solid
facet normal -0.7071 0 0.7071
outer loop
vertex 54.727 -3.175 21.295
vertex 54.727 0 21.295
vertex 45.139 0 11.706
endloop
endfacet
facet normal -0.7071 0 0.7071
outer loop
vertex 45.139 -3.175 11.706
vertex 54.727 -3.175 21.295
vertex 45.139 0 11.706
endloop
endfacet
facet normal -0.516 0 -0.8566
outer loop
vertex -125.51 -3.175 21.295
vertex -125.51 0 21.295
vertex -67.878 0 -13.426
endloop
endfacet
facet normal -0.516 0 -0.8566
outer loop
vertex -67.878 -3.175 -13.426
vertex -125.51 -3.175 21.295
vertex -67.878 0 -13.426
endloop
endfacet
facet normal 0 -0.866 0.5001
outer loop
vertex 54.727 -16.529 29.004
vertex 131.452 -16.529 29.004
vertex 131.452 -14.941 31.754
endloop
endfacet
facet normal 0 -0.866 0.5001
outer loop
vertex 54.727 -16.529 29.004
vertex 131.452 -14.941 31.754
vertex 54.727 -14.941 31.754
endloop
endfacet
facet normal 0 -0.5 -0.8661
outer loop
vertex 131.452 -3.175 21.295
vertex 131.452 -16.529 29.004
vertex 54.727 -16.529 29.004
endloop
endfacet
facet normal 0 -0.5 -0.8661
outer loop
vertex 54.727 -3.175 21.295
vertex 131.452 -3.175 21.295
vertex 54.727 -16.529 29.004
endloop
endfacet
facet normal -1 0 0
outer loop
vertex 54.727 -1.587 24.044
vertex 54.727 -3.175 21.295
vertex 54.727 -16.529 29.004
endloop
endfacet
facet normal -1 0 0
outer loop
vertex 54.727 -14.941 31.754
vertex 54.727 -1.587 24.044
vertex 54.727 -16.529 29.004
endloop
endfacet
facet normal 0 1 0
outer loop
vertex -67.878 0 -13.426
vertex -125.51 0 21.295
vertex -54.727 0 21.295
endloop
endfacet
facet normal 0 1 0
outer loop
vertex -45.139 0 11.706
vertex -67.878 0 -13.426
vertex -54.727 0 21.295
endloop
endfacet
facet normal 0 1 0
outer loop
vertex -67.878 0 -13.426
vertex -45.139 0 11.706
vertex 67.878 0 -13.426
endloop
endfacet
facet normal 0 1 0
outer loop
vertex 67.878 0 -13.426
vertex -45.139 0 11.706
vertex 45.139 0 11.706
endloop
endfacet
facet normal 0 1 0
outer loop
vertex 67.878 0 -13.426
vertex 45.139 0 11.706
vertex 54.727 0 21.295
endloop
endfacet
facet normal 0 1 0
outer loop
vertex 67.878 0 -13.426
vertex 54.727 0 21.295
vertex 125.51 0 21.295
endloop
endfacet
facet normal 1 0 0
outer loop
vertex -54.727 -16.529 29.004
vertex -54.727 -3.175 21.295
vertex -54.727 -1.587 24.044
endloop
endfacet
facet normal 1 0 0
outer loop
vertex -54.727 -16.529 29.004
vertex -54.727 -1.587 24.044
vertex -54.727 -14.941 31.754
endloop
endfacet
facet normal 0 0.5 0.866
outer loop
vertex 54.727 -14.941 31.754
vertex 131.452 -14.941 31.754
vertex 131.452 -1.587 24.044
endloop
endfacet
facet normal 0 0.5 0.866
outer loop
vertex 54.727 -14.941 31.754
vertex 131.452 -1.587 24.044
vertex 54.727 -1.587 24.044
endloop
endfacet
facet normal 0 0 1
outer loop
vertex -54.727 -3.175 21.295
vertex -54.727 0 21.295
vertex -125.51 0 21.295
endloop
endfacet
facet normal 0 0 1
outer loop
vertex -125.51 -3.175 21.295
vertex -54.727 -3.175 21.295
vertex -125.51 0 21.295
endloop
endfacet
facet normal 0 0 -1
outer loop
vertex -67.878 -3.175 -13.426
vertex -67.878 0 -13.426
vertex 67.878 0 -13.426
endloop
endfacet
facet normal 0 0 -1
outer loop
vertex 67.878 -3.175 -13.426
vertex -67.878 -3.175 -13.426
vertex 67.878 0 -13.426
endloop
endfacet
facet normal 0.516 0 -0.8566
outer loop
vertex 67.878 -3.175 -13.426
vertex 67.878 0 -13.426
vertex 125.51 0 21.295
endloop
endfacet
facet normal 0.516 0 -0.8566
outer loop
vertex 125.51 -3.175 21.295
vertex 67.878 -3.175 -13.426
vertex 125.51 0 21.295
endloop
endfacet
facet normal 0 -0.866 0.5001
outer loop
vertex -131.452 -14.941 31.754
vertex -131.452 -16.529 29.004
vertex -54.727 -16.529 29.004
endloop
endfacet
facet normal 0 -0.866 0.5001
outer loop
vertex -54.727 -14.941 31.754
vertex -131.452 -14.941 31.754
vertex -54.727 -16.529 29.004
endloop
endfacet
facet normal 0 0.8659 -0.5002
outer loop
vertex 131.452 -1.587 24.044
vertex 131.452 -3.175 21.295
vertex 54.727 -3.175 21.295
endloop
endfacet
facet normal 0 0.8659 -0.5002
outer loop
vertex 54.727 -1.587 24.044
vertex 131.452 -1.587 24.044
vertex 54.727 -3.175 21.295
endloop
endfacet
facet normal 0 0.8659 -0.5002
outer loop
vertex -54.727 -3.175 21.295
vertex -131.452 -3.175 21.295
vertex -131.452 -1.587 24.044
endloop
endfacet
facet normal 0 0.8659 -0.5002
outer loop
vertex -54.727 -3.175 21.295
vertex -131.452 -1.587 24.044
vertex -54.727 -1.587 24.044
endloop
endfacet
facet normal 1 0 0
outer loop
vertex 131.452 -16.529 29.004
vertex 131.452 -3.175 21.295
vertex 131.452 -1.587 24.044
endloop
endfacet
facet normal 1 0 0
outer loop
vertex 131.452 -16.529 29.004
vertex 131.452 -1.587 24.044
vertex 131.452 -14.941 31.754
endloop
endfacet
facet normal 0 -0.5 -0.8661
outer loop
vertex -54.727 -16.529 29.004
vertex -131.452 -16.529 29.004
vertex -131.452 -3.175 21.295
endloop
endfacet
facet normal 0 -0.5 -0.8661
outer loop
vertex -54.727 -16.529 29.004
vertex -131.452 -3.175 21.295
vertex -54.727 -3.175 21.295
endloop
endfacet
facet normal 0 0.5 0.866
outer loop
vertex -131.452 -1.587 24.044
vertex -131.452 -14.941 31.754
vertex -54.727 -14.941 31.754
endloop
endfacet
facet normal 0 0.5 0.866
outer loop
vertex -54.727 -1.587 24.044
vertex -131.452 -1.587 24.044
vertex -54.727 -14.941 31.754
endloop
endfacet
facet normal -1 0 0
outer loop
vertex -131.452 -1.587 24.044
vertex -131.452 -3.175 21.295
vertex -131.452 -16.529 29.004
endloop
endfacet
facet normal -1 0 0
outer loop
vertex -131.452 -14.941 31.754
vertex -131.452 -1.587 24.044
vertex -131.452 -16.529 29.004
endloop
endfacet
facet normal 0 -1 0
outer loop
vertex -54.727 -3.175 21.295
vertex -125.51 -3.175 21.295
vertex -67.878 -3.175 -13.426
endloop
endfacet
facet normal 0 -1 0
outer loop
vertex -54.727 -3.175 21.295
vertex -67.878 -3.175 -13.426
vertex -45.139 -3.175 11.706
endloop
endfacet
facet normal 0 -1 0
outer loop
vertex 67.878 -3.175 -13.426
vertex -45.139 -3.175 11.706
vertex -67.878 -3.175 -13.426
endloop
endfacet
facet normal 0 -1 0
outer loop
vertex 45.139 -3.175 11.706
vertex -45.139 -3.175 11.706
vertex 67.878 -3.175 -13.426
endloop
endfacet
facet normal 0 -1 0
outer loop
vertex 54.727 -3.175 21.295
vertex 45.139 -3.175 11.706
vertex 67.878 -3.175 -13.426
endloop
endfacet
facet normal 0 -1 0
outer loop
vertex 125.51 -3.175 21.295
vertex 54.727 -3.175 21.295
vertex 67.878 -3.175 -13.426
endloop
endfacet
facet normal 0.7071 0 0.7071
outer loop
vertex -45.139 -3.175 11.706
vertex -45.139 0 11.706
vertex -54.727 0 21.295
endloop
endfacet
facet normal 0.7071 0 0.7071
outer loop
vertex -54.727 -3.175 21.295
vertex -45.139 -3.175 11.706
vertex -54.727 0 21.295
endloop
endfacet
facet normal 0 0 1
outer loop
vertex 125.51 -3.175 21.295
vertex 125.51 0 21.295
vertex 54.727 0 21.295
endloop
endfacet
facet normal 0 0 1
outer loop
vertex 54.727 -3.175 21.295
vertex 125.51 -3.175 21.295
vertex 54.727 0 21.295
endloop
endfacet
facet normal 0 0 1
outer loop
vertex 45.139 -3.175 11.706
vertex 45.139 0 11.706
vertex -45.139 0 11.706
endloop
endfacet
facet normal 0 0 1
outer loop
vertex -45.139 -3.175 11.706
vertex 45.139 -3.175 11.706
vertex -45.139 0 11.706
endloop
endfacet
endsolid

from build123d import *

# Parameters (mm, degrees)
F1_DEPTH = 3.175
F3_W     = 76.724223
F3_H     = 15.419518
F4_DEPTH = 3.175


with BuildPart() as f1:
    # F0 (on Front) → F1 (new body)
    with BuildSketch(Plane.XZ):
        Polygon((45.139141, 11.706416), (0, 11.706416), (-45.139141, 11.706416), (-54.727294, 21.294571), (-125.50962, 21.294571), (-67.878358, -13.426401), (0, -13.426401), (67.878358, -13.426401), (125.50962, 21.294571), (54.727294, 21.294571), align=None)
    extrude(amount=F1_DEPTH)


with BuildPart() as f4:
    # F3 (on face) → F4 (new body)
    with BuildSketch(Plane(origin=(0, 8.42707, 14.596113), x_dir=(1, 0, 0), z_dir=(0, -0.5, -0.866025))):
        with Locations((-93.089405, 21.106675)):
            Rectangle(F3_W, F3_H)
    extrude(amount=-F4_DEPTH)


with BuildPart() as f5_1:
    # F5: instance of F4
    add(f4.part.mirror(Plane.YZ))


solid = Compound([f1.part, f4.part, f5_1.part])
